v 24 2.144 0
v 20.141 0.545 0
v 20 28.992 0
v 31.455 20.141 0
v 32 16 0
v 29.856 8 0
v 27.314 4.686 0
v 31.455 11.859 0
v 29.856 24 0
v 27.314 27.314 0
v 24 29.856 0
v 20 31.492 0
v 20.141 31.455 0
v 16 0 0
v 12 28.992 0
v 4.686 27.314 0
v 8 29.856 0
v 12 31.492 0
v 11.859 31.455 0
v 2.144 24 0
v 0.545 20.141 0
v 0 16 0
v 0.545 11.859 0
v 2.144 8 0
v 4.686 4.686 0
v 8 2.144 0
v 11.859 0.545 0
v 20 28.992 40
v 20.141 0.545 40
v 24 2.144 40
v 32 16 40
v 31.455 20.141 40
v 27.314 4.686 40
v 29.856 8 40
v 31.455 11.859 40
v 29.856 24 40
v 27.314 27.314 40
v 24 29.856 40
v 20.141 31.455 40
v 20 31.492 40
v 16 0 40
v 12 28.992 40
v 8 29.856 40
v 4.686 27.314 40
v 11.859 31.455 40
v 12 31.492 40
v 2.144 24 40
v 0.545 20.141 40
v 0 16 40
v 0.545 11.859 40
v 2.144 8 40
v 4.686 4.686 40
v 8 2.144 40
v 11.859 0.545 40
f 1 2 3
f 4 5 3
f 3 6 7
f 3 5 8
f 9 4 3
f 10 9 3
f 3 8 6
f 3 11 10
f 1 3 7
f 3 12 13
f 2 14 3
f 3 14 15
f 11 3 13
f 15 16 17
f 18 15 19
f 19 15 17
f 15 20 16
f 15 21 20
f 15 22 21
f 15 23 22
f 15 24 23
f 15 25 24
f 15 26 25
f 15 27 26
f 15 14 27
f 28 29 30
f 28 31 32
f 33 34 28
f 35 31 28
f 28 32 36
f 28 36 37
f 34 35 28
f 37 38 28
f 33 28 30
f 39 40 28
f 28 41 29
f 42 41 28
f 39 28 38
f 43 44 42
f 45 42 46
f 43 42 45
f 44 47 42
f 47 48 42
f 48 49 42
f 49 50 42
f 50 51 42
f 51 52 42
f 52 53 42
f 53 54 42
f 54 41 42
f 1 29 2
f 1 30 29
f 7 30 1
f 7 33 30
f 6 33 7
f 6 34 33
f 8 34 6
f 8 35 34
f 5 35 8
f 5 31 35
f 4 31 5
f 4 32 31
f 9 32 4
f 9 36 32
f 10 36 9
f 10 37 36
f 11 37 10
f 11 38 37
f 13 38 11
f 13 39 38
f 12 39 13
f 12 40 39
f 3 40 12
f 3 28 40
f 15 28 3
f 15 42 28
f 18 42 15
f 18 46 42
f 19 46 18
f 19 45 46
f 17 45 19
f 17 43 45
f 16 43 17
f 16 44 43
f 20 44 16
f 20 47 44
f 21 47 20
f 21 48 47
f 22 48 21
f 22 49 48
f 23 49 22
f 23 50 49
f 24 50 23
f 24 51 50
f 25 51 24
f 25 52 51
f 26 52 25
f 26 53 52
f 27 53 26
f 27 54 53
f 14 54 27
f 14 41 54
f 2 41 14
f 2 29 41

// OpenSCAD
$fn = 32;

// ----------------------------------------------------------------------
// Keyway shaft: d32 shaft, key 8 x 2.5 mm
// ----------------------------------------------------------------------

// --- parameters (mm) ---
shaft_r = 16;             // shaft radius
key_w = 8;                // keyway width
key_d = 2.5;              // keyway depth below the surface line
plate_t = 40;             // shaft length, Z (extrusion height)
fit_tol = 0.1;            // declared fit tolerance (prompt contract)
free_tol = 0.5;           // declared free tolerance (prompt contract)

shaft_d = 2 * shaft_r;  // shaft diameter
circle_step = 15;  // polygon sampling step, degrees

profile = [[11.859, 31.455], [8, 29.856], [4.686, 27.314], [2.144, 24], [0.545, 20.141], [0, 16], [0.545, 11.859], [2.144, 8], [4.686, 4.686], [8, 2.144], [11.859, 0.545], [16, 0], [20.141, 0.545], [24, 2.144], [27.314, 4.686], [29.856, 8], [31.455, 11.859], [32, 16], [31.455, 20.141], [29.856, 24], [27.314, 27.314], [24, 29.856], [20.141, 31.455], [20, 31.492], [20, 28.992], [12, 28.992], [12, 31.492]];  // primary outline, 27 points, counter clockwise

// --- the one profile operation ---
linear_extrude(height = plate_t) polygon(points = profile);
